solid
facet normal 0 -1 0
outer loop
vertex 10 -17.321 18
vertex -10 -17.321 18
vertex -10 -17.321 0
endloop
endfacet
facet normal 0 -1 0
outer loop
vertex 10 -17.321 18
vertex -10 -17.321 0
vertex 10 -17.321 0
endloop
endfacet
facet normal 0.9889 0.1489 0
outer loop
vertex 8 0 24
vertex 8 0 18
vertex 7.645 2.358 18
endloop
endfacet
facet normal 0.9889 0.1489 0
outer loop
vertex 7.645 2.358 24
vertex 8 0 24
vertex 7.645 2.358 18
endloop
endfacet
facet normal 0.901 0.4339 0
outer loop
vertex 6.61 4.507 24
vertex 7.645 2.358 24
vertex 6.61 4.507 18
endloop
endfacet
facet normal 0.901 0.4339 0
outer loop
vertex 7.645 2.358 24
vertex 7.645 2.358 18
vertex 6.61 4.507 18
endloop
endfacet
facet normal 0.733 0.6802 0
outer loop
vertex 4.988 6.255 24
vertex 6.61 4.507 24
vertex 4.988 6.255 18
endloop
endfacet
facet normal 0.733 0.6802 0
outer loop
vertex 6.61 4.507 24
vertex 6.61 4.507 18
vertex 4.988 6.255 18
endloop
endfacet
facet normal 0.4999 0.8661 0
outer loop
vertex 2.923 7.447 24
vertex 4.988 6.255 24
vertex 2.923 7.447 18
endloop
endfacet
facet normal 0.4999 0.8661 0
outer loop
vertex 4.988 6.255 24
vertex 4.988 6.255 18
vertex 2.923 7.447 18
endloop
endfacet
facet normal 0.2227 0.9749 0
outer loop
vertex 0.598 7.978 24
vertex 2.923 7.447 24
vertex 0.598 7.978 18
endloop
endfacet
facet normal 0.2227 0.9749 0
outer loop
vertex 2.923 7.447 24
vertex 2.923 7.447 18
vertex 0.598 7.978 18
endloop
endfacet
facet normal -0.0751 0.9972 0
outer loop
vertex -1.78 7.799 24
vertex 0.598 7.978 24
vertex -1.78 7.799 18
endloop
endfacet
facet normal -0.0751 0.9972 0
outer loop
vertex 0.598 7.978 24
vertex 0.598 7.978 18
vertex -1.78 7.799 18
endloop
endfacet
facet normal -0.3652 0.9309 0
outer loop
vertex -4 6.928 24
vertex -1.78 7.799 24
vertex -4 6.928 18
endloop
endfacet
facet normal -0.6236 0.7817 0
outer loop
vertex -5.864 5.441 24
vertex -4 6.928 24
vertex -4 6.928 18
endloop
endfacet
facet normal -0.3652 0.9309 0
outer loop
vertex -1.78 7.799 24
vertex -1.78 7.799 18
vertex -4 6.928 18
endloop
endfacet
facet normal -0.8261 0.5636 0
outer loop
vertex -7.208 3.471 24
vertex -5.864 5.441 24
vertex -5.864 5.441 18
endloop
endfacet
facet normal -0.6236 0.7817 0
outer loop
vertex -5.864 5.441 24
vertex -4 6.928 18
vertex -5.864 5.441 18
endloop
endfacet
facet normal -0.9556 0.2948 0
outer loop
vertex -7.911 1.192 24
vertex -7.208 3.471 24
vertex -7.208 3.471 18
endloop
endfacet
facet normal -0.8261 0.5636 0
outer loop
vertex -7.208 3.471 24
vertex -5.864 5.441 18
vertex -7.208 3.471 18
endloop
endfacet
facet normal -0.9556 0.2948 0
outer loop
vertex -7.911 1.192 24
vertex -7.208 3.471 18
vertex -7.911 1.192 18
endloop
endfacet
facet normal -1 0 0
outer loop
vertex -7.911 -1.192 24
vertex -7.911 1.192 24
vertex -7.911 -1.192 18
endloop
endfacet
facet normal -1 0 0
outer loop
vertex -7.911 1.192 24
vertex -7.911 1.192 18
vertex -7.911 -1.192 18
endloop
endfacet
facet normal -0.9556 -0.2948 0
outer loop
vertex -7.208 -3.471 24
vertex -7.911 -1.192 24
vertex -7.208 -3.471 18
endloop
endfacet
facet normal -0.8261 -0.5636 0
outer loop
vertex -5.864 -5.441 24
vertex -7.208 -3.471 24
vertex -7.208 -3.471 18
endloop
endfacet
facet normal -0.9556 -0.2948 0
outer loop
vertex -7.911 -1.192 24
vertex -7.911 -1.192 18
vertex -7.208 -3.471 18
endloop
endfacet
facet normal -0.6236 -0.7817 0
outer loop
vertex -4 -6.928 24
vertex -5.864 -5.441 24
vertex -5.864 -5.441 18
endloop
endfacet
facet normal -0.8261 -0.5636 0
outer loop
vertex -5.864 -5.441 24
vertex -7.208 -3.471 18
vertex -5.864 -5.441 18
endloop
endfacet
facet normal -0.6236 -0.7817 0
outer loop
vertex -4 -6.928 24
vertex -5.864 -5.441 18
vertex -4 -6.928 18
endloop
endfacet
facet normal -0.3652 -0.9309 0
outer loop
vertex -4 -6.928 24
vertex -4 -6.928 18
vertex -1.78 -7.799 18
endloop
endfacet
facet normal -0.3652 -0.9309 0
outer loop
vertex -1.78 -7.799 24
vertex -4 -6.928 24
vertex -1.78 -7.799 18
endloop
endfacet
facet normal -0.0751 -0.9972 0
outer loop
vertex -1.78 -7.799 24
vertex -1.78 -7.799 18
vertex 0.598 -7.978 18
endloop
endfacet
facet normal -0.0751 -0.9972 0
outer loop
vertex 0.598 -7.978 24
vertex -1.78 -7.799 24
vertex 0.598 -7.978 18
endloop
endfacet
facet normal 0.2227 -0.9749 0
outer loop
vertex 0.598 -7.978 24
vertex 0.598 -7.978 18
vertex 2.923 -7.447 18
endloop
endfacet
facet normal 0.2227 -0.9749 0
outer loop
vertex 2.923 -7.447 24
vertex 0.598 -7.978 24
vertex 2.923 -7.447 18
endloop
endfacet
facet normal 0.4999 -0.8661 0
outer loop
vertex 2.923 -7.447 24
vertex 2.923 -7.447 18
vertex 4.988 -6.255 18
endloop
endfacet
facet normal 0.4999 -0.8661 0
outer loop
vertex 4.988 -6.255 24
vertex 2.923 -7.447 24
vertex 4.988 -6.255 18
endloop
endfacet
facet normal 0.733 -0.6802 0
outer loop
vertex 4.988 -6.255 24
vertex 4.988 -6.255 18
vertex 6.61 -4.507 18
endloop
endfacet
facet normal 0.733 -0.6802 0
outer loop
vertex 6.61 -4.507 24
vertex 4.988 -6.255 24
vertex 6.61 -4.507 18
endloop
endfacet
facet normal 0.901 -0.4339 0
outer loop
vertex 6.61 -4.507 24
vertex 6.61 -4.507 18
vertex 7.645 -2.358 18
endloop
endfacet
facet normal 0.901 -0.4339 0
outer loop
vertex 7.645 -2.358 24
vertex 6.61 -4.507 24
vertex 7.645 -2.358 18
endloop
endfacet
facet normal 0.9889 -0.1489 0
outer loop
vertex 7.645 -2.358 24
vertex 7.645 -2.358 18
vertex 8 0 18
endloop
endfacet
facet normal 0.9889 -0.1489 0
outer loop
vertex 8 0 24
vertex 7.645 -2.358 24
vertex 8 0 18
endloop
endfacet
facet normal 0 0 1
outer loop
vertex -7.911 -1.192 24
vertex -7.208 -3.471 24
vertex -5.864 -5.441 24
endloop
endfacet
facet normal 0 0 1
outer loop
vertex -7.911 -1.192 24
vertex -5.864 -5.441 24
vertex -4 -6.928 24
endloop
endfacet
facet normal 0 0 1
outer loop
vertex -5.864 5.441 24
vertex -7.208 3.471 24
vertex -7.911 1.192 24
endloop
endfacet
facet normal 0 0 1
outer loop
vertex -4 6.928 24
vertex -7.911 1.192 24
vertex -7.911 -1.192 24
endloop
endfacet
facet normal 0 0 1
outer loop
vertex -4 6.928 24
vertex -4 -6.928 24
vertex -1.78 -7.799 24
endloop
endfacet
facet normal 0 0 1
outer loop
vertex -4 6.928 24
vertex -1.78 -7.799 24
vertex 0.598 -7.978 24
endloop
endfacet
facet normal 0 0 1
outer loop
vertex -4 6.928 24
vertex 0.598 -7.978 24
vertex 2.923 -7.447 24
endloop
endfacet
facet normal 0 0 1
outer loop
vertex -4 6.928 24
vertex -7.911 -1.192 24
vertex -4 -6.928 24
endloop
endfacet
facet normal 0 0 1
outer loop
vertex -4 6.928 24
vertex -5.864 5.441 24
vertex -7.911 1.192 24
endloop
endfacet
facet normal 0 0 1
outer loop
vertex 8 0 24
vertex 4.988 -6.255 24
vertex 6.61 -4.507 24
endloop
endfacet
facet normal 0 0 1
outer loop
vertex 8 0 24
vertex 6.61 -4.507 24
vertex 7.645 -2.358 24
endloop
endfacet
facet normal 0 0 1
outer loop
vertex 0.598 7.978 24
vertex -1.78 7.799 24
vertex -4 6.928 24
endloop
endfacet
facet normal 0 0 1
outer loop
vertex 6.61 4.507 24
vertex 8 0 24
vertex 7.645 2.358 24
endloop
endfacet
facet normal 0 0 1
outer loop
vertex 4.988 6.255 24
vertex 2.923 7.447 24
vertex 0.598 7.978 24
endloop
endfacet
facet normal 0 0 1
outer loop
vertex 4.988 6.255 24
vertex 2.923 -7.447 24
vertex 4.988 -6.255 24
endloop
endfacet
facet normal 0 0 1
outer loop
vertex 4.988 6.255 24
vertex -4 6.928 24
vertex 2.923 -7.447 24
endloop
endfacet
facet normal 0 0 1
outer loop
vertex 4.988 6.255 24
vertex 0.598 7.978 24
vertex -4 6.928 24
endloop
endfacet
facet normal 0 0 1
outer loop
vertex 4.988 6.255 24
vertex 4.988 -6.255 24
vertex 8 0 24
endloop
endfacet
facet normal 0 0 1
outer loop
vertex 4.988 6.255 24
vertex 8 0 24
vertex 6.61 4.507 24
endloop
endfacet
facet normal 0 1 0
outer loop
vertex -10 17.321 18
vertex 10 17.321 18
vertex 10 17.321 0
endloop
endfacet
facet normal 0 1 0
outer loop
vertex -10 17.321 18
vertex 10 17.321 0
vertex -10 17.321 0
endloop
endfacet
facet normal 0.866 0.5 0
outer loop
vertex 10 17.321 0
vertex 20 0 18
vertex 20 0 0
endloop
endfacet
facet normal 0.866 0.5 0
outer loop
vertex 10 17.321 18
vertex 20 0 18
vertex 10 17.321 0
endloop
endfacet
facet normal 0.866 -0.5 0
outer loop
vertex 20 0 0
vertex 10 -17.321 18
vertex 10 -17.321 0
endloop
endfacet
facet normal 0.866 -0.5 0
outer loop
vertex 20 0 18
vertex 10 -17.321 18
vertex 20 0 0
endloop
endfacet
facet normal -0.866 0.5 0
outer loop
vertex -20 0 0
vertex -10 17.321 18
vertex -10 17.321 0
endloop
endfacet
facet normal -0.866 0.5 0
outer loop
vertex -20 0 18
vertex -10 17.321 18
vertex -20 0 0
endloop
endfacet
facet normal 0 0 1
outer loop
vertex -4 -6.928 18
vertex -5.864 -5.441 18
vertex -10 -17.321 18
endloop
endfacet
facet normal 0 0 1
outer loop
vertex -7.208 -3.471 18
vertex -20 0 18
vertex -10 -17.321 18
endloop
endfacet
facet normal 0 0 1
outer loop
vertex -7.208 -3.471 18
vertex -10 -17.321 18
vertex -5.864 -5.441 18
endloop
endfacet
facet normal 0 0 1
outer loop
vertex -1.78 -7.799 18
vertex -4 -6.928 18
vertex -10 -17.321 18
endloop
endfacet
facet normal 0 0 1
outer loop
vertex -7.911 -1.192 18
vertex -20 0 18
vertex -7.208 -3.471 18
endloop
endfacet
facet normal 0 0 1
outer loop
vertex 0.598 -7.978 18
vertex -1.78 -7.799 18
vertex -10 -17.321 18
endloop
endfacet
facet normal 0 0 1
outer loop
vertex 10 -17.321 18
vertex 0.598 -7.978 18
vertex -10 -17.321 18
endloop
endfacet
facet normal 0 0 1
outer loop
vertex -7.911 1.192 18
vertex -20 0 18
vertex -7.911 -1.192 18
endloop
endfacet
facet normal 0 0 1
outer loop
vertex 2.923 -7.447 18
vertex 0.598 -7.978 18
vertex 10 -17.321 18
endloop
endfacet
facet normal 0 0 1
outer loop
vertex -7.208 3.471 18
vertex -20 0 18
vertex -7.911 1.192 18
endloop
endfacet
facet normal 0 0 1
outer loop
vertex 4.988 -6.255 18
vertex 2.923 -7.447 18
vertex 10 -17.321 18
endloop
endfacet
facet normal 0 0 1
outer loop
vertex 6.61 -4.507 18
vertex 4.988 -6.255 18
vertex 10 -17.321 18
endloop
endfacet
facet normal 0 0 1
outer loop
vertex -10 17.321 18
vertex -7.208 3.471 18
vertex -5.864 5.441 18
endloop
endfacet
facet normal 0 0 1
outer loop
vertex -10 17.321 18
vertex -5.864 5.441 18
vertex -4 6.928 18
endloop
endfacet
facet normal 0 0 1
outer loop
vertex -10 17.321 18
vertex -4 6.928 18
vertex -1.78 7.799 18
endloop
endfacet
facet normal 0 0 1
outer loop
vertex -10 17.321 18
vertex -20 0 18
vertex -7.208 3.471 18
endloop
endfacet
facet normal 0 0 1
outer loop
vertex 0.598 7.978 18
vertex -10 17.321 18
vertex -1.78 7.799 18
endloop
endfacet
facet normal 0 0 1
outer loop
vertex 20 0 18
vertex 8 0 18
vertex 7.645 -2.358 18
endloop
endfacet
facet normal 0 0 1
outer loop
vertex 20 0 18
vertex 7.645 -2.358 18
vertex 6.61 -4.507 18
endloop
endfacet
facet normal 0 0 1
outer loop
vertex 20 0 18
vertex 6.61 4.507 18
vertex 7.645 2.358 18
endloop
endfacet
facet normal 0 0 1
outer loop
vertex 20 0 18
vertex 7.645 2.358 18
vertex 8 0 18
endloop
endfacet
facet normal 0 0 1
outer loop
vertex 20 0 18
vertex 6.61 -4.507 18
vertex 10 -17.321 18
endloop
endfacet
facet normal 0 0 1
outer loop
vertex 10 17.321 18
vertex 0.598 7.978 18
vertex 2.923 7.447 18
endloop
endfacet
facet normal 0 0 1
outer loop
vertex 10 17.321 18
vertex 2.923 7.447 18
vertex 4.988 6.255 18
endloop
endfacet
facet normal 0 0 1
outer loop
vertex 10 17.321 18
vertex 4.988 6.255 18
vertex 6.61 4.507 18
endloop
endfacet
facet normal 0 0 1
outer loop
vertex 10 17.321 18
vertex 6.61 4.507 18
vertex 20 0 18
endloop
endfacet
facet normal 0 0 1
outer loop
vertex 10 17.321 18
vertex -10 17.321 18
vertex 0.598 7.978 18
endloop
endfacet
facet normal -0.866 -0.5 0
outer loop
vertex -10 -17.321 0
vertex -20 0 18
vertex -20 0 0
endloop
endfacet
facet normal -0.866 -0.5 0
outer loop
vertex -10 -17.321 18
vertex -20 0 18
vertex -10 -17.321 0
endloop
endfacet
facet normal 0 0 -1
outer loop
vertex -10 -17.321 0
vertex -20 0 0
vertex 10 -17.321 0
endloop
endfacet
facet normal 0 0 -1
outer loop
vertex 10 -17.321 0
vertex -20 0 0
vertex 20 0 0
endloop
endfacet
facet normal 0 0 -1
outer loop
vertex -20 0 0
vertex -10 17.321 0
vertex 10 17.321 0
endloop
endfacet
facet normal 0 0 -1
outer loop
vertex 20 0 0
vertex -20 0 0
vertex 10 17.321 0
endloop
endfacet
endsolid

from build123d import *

# Parameters (mm, degrees)
SKETCH_1_R          = 8
EXTRUDE_1_DEPTH     = 24
SKETCH_2_R          = 42
EXTRUDE_2_DEPTH     = 18
SKETCH_3_OUTSIDE_W  = 110.238
SKETCH_3_OUTSIDE_H  = 110.238
CUT_EXTRUDE_1_DEPTH = 63.064482597


with BuildPart() as part:
    # 草图1 → 凸台-拉伸1 (new body)
    with BuildSketch(Plane.XY):
        Circle(SKETCH_1_R)
    extrude(amount=EXTRUDE_1_DEPTH)

    # 草图2 → 凸台-拉伸2 (add)
    with BuildSketch(Plane.XY):
        Circle(SKETCH_2_R)
    extrude(amount=EXTRUDE_2_DEPTH)

    # 草图3 outside → 切除-拉伸1 (cut, through all)
    with BuildSketch(Plane.XY.offset(18)):
        Rectangle(SKETCH_3_OUTSIDE_W, SKETCH_3_OUTSIDE_H)
        Polygon((20, 0), (10, 17.320508076), (-10, 17.320508076), (-20, 0), (-10, -17.320508076), (10, -17.320508076), align=None, mode=Mode.SUBTRACT)
    extrude(amount=-CUT_EXTRUDE_1_DEPTH, mode=Mode.SUBTRACT)


solid = part.part
